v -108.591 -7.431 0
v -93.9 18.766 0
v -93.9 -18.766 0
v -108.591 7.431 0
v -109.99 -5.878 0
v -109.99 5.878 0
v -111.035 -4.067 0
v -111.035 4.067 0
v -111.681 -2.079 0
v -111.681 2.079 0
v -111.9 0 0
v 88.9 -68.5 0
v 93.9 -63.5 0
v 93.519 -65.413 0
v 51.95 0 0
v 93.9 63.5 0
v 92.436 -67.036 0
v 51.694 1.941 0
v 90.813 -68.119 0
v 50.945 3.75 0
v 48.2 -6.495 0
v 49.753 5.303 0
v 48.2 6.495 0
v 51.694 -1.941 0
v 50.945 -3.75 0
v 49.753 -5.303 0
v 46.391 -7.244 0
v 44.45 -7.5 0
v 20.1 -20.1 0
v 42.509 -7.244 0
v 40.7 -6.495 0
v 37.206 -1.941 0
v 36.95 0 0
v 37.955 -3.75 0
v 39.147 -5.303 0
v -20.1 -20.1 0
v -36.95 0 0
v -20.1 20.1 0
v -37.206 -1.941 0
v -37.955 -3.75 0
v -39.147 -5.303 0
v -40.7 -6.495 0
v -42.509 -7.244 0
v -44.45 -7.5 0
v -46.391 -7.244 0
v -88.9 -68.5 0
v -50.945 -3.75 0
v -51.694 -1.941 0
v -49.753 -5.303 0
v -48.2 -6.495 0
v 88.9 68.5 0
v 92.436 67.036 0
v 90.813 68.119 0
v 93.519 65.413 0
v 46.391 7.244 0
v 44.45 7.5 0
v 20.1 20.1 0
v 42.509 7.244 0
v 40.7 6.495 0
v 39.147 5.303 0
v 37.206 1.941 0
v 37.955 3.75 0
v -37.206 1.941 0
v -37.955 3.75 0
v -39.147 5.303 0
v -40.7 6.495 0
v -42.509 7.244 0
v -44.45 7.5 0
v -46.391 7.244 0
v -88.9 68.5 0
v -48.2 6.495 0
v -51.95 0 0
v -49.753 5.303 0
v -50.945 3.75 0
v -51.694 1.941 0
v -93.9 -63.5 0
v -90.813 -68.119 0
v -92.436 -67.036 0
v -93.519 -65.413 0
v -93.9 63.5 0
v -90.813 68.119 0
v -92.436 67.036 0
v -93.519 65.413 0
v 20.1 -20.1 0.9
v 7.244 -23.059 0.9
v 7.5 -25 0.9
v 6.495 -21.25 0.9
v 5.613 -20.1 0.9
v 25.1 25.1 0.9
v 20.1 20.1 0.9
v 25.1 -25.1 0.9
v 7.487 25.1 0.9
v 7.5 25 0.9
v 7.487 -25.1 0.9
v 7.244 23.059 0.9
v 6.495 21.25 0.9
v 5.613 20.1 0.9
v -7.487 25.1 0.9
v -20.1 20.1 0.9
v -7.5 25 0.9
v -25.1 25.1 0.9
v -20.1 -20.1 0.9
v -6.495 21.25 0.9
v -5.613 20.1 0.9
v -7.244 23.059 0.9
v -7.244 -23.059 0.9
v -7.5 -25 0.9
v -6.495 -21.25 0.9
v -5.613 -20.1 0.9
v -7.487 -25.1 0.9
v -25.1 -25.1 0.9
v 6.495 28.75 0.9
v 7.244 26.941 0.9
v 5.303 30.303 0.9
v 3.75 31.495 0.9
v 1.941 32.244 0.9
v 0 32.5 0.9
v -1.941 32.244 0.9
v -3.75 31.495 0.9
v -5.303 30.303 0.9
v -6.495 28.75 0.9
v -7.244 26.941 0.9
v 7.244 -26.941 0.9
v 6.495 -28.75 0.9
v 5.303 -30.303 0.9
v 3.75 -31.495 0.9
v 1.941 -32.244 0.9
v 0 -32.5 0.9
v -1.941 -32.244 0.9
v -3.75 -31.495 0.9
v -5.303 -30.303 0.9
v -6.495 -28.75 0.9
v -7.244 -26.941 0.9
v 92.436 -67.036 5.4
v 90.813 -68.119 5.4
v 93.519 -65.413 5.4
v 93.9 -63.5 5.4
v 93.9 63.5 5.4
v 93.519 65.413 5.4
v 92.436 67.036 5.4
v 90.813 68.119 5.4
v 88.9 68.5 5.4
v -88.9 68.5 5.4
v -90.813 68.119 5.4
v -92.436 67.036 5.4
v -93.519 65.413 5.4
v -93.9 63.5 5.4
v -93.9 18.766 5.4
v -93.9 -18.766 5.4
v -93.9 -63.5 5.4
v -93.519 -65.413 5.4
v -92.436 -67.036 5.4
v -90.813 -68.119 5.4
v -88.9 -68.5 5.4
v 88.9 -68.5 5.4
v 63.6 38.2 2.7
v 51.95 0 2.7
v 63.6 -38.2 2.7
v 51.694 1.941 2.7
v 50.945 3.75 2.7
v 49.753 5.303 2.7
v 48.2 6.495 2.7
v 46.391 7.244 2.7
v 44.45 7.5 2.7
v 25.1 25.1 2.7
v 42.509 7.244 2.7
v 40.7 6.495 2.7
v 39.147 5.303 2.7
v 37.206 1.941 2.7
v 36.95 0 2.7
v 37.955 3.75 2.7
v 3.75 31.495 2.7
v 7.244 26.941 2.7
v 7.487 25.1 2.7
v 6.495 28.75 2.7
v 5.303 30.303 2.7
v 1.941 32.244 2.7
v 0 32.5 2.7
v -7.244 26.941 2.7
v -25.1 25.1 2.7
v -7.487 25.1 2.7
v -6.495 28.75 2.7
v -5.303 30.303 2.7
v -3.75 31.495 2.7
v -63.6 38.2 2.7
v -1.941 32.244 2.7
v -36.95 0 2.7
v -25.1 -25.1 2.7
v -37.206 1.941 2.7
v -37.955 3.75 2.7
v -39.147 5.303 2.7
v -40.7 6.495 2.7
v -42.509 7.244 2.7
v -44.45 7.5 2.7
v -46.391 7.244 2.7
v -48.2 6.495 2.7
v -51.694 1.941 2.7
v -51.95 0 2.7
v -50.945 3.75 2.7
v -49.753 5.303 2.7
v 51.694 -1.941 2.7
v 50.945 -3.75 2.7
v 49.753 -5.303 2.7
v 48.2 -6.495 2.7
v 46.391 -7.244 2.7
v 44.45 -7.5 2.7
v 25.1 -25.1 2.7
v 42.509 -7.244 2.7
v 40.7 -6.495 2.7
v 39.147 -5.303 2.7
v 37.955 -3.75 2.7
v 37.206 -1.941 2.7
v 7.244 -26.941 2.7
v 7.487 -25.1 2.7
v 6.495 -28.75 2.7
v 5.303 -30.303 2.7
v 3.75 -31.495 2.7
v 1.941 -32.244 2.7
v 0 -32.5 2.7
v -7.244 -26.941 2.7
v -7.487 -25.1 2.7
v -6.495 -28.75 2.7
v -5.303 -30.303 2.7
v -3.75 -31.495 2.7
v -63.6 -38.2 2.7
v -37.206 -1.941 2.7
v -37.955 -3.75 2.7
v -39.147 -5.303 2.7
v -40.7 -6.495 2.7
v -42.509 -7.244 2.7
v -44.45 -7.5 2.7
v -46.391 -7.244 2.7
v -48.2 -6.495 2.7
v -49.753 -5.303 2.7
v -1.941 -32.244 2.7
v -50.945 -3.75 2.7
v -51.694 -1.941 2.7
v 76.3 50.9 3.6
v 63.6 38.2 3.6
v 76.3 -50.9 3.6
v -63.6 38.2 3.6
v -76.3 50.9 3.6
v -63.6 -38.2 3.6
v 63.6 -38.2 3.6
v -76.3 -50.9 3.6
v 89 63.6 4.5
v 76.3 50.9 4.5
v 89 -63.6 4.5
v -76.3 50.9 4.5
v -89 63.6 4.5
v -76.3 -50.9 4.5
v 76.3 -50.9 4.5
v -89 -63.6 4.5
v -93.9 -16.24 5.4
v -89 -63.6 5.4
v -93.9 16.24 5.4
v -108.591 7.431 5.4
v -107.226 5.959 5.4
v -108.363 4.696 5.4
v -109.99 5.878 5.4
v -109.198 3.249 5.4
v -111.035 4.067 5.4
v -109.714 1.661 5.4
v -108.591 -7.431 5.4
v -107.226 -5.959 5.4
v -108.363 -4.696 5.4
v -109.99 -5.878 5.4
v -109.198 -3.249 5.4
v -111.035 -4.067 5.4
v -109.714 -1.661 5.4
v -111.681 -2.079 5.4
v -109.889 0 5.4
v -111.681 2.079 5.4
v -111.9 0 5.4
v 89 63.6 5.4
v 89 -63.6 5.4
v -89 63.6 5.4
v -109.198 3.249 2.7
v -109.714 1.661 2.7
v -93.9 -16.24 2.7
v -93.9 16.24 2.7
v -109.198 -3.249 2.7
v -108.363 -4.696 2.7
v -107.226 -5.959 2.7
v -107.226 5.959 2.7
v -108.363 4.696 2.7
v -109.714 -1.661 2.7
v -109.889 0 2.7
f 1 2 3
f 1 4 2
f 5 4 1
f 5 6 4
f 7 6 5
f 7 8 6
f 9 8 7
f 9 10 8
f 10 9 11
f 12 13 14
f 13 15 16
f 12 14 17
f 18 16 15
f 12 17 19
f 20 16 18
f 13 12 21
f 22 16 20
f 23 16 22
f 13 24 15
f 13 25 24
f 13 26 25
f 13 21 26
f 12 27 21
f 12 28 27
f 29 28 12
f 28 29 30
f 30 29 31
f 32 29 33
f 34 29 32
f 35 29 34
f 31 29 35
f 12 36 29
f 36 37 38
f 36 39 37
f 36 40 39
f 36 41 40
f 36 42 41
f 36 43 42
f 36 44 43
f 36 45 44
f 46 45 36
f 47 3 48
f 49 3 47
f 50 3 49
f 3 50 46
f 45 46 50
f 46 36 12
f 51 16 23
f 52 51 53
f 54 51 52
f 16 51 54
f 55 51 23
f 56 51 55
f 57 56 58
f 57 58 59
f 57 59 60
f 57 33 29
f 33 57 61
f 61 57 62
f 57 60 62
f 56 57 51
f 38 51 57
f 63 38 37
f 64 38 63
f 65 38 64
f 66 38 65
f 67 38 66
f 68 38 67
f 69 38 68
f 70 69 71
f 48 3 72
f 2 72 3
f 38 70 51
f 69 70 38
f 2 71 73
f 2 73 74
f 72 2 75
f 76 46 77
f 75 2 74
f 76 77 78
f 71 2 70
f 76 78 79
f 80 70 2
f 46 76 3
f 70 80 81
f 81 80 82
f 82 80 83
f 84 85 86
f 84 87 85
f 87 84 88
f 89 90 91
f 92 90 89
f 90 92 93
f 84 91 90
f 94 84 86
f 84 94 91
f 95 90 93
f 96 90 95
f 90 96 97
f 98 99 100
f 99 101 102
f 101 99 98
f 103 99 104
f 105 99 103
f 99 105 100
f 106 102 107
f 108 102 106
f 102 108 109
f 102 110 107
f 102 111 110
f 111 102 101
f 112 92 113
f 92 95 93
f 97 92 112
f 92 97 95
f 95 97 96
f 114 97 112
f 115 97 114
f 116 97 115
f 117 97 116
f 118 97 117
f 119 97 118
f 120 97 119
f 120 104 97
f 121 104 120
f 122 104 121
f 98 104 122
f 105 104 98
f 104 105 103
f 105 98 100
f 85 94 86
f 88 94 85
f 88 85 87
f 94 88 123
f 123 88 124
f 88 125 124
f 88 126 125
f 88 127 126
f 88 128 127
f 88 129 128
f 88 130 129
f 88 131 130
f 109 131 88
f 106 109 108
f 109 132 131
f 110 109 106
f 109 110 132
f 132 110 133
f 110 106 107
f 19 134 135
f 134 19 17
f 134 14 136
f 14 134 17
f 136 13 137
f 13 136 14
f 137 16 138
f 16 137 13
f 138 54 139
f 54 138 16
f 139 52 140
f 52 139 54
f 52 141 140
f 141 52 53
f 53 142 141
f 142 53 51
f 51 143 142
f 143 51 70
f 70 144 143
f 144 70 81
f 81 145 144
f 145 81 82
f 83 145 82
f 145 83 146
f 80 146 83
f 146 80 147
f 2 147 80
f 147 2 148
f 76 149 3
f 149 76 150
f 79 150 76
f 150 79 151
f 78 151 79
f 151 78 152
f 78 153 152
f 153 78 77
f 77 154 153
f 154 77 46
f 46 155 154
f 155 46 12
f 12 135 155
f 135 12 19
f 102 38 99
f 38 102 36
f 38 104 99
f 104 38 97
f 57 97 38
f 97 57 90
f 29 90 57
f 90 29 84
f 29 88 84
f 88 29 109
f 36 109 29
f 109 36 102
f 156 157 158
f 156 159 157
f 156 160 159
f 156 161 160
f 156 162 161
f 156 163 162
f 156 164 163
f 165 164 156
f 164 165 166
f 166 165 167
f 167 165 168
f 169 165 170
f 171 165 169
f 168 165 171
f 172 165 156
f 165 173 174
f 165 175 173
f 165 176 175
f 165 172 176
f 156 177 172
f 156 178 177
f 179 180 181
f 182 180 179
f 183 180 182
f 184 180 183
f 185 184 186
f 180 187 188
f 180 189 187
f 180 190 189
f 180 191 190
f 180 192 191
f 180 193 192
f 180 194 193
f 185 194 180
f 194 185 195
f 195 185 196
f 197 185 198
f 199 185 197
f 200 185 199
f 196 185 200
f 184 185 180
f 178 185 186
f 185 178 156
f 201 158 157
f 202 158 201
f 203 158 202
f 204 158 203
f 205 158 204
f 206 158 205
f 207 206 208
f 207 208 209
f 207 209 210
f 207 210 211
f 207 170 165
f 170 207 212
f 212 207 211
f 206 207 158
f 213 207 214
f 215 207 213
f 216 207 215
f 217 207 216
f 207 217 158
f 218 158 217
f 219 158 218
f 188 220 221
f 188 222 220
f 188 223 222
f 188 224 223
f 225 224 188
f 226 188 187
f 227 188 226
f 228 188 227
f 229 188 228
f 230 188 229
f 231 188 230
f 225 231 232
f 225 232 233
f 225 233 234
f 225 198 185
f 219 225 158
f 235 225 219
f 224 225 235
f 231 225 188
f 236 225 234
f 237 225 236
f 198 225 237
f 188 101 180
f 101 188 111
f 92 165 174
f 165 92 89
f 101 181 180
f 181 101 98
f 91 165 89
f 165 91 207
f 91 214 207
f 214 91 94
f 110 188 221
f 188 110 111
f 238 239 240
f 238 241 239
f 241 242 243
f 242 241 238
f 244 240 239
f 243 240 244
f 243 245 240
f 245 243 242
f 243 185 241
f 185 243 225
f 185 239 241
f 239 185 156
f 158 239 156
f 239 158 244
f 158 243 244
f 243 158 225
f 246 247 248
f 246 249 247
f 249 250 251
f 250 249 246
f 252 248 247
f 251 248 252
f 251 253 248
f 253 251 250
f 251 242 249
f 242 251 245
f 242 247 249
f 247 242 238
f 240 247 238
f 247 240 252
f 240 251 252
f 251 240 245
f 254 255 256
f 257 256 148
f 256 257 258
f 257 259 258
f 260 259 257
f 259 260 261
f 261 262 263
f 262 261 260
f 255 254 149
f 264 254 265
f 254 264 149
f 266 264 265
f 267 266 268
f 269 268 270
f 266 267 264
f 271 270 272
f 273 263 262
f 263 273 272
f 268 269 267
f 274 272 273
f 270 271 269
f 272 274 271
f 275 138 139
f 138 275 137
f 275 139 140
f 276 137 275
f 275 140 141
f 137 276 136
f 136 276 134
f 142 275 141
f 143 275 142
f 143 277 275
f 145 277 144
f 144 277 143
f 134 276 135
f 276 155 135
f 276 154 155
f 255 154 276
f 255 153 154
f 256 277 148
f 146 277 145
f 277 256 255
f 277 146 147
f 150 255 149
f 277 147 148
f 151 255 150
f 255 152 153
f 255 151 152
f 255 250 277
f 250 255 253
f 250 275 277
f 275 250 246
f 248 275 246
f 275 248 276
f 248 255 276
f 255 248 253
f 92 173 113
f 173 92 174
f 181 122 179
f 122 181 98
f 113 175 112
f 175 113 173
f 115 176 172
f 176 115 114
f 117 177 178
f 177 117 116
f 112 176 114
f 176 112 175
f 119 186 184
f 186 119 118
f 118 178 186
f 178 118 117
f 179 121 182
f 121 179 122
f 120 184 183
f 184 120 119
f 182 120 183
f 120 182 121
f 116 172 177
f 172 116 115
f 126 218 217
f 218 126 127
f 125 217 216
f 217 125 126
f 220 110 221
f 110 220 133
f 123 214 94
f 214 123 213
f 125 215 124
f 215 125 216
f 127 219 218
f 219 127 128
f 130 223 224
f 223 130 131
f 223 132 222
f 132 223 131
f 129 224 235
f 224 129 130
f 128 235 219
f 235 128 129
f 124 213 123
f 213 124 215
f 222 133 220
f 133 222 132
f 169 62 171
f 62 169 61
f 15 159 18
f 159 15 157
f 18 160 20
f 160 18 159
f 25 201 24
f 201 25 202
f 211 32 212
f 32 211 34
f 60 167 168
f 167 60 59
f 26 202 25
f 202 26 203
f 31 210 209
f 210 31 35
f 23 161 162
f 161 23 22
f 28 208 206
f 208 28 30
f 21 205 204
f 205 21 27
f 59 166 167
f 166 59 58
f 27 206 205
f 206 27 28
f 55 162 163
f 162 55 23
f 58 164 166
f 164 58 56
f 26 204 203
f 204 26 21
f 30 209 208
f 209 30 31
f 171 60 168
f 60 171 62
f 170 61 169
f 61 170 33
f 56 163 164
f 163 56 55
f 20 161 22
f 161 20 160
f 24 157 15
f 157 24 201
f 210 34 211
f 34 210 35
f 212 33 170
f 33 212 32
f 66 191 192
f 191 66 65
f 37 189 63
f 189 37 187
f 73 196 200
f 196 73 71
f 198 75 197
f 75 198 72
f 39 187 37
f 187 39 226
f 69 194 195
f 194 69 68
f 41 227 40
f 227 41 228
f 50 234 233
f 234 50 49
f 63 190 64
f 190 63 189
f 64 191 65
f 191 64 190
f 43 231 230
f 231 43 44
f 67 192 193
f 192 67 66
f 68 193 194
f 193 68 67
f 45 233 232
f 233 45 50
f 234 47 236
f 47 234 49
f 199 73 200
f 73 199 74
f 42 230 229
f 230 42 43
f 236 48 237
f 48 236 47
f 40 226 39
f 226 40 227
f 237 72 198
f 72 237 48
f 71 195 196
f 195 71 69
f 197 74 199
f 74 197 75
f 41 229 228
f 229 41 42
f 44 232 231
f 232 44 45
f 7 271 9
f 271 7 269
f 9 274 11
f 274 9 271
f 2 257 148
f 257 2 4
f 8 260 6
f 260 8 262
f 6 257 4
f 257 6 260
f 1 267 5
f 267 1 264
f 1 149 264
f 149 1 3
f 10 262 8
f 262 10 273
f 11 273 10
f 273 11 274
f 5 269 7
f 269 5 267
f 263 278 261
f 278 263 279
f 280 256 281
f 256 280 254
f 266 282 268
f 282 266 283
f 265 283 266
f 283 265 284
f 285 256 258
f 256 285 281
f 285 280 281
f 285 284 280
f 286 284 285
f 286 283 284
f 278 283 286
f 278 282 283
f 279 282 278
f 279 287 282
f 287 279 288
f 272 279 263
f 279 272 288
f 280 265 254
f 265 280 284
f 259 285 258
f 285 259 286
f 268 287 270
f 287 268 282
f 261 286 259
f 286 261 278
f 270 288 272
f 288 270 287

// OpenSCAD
// Parts for photo digitizer
// Adrian McCarthy 2024-01-29
// with Jason Adler

function cumulative_sum(layers) = [
  for (i = 0, h = 0; i < len(layers); h = h + layers[i], i = i+1) h
];

function inch(x) = 25.4 * x;

layers = [
    [40, 40, 0.9], // accommodates 127 aperture
    [50, 50, 1.8], // 2"x2" slide mount
    [inch(5), inch(3), 0.9],
    [inch(6), inch(4), 0.9],
    [inch(7), inch(5), 0.9]
];
w = max([for (layer=layers) layer.x]);
h = max([for (layer=layers) layer.y]);
lift = cumulative_sum([for (layer=layers) layer.z]);
total_lift = lift[len(lift)-1] + layers[len(layers)-1].z;

border = 5;
rim_h = max(5, total_lift);
rim_th = 2;
frame_th = 2;
frame_h = 160;

module rim(nozzle_d=0.4) {
    linear_extrude(rim_h) difference() {
        offset(r=border) square([w, h], center=true);
        offset(r=border-rim_th) square([w, h], center=true);
    }
}

module tab(nozzle_d=0.4) {
    d = 20;
    module tab_footprint() {
        hull() {
            translate([-d/2, 0]) circle(d=d);
            translate([-nozzle_d/2, 0]) square([nozzle_d, 2*d], center=true);
        }
    }

    difference() {
        linear_extrude(rim_h) tab_footprint();
        translate([0, 0, 0.5*rim_h])
            linear_extrude(rim_h) offset(r=-rim_th) tab_footprint();
    }
}

module photo_plate(clearance=undef, nozzle_d=0.4) {
    c = is_undef(clearance) ? nozzle_d/2 : clearance;
    difference() {
        for (i = [0:len(layers)-1]) {
            translate([0, 0, lift[i]]) {
                linear_extrude(layers[i].z) {
                    difference() {
                        offset(r=border) square([w, h], center=true);
                        square([layers[i].x+c, layers[i].y+c], center=true);
                    }
                }
            }
        }
        
        // Holes to extract slides
        translate([0,  25, lift[1]]) cylinder(h=total_lift+2, d=15);
        translate([0, -25, lift[1]]) cylinder(h=total_lift+2, d=15);

        // Holes to make it easy to remove photos by poking them from below.
        translate([ w/4, 0, -1]) cylinder(h=total_lift+2, d=15);
        translate([-w/4, 0, -1]) cylinder(h=total_lift+2, d=15);
    }
    rim(nozzle_d=nozzle_d);
    translate([-w/2-(border-rim_th), 0]) tab(nozzle_d=nozzle_d);
}

module logitech_brio_plate(nozzle_d=0.4) {
    base_th = 1.2;
    camera_support_th = 2;
    camera_support_h = 12;

    module lozenge() {
        d = 27;  // diameter of circular "ends" of camera
        l = 102;  // full length of camera
        dx = (l - d) / 2;
        hull() {
            translate([-dx, 0]) circle(d=d, $fn=50);
            translate([ dx, 0]) circle(d=d, $fn=50);
        }
    }

    linear_extrude(base_th) {
        difference() {
            offset(r=5) square([w, h], center=true);
            circle(d=10+nozzle_d);
        }
    }
    rim(nozzle_d=nozzle_d);
    translate([0, 0, base_th]) {
        linear_extrude(camera_support_h) {
            difference() {
                offset(r=camera_support_th) lozenge();
                offset(r=nozzle_d/2) lozenge();
            }
        }
    }
}

module frame(nozzle_d=0.4) {
    linear_extrude(frame_th) {
        difference() {
            offset(r=2*border) square([w, h], center=true);
            offset(r=-border) square([w, h], center=true);
        }
    }
    translate([0, 0, frame_th]) {
        linear_extrude(rim_h+0.3) {
            difference() {
                offset(r=2*border) square([w, h], center=true);
                offset(r=border) square([w, h], center=true);
                translate([-w/2, 0]) square([4*border, h+2*border], center=true);
            }
        }
    }
}

if ($preview) {
    color("yellow") frame();
    translate([0, 0, frame_th]) {
        color("orange") translate([0, 0, 0.1]) photo_plate(clearance=0.3);
        //color("blue") translate([0, 0, frame_h]) logitech_brio_plate();
    }
} else {
    photo_plate();
}
